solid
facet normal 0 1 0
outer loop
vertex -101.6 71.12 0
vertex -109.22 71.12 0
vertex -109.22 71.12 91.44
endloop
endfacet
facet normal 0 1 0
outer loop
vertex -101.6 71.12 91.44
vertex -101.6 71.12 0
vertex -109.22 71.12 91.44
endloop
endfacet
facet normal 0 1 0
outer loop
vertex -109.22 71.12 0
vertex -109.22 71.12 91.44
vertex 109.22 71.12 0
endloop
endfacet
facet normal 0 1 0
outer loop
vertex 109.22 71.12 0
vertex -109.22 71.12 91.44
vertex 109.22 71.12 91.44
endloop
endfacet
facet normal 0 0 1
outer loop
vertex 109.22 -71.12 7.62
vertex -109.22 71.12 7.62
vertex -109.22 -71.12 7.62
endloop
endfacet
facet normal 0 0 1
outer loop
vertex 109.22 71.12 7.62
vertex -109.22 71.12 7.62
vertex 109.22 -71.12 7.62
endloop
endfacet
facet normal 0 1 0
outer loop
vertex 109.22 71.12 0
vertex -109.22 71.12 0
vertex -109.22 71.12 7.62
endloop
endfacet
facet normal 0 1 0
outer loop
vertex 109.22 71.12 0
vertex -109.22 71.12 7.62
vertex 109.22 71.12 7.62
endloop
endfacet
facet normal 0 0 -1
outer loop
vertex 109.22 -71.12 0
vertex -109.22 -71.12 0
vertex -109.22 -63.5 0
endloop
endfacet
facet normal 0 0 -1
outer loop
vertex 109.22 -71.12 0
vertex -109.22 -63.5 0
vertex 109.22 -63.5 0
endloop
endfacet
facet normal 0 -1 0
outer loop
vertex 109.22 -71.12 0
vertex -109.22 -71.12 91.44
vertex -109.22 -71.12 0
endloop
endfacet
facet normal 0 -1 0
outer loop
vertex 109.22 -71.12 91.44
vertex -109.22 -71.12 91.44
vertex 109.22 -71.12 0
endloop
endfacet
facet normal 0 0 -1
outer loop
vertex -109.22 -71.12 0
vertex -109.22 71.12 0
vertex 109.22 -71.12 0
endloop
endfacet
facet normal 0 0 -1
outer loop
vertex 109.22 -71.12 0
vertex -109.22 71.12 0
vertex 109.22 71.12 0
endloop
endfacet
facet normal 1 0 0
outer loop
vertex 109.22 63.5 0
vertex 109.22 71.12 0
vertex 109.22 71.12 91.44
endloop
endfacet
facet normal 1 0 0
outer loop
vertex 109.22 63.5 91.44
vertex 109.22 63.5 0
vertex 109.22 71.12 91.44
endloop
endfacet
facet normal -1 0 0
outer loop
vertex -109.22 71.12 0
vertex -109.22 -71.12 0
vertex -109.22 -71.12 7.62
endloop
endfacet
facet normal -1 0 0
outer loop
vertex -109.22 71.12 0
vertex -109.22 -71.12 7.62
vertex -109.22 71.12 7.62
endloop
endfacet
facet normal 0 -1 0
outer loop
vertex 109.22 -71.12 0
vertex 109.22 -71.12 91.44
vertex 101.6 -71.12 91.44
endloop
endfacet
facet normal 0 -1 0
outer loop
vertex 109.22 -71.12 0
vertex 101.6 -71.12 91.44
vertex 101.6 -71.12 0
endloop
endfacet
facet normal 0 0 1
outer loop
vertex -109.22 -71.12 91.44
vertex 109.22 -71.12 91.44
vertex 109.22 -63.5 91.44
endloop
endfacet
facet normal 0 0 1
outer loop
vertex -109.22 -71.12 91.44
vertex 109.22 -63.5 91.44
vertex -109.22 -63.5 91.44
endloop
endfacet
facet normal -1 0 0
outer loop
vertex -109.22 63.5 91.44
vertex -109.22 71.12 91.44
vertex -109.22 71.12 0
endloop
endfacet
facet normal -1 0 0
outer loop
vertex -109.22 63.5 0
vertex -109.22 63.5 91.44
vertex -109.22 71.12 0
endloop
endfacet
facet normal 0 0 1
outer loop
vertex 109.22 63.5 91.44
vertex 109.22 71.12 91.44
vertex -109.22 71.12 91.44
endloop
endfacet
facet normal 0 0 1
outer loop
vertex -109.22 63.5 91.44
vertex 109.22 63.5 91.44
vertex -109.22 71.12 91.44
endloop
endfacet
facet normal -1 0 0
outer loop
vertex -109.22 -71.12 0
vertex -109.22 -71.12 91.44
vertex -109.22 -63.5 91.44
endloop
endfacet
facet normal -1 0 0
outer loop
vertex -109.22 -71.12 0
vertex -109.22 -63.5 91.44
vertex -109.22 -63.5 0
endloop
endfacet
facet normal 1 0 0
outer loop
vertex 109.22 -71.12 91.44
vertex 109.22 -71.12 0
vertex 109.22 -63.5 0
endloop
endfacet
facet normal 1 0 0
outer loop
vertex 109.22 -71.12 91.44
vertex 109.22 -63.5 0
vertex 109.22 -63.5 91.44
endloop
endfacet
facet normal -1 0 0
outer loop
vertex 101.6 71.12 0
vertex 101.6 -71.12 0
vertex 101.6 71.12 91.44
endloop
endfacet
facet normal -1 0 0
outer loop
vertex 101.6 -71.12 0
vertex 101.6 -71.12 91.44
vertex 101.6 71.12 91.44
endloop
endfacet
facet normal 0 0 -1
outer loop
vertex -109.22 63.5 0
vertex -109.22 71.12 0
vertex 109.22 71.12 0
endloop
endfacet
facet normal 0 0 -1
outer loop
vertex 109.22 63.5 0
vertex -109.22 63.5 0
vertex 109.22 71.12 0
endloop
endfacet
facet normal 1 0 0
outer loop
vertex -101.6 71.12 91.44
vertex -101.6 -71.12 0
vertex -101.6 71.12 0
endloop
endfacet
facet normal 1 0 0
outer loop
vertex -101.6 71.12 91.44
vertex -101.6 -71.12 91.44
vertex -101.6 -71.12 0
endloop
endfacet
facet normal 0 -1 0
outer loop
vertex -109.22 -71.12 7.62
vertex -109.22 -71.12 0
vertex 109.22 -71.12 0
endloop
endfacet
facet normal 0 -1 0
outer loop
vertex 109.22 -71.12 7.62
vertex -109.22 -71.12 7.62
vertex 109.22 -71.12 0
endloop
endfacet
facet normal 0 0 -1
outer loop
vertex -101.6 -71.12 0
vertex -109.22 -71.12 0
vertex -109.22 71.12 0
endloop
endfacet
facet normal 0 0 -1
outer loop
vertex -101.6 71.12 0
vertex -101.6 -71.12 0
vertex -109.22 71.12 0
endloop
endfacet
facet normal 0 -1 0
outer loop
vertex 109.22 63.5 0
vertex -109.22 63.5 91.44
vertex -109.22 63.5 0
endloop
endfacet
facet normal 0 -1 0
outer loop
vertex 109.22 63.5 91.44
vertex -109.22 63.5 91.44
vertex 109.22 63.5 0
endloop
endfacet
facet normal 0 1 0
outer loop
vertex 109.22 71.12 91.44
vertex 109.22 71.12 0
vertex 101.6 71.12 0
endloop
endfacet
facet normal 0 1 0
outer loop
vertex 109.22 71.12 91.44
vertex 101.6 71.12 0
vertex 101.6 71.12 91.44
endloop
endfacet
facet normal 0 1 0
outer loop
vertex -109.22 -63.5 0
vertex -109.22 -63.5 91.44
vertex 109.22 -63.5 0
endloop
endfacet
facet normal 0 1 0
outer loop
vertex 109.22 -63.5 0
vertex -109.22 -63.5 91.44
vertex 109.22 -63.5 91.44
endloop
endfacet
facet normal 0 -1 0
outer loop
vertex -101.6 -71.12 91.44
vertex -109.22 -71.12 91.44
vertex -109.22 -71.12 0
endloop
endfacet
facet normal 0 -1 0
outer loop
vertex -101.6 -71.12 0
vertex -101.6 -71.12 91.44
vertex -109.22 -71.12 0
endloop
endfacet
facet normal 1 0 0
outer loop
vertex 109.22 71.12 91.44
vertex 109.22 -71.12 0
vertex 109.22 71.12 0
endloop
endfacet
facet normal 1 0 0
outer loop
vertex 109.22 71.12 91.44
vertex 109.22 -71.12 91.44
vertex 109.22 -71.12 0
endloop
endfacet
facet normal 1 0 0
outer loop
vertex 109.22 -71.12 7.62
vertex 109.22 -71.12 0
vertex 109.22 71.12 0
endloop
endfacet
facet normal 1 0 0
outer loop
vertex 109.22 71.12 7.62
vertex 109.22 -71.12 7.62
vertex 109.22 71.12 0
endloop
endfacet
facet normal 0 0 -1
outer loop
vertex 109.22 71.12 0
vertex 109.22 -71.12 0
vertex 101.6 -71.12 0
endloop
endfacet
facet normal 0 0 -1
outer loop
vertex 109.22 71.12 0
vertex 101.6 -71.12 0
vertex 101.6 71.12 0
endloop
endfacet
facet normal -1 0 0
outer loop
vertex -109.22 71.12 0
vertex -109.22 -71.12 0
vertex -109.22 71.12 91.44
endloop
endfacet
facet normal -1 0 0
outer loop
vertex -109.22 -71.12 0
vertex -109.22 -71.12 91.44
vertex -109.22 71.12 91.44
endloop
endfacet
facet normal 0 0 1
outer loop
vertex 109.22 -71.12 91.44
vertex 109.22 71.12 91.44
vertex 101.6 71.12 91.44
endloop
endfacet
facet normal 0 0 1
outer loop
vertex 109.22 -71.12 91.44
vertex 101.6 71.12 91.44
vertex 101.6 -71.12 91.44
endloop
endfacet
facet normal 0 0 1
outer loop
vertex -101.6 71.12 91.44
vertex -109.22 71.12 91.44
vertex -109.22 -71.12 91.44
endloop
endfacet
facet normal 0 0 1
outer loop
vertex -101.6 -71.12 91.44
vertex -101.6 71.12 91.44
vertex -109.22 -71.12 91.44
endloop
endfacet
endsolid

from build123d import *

# Parameters (mm, degrees)
F0_W     = 218.44
F0_H     = 142.24
F1_DEPTH = 7.62
F4_DEPTH = 7.62
F8_DEPTH = 7.62


with BuildPart() as f1:
    # F0 (on Top) → F1 (new body)
    with BuildSketch(Plane.XY):
        Rectangle(F0_W, F0_H)
    extrude(amount=F1_DEPTH)


with BuildPart() as f4:
    # F3 (on offset) → F4 (new body)
    with BuildSketch(Plane.XZ.offset(71.12)):
        Polygon((-109.22, 0), (0, 0), (109.22, 0), (109.22, 91.44), (-109.22, 91.44), align=None)
    extrude(amount=-F4_DEPTH)


with BuildPart() as f5_1:
    # F5: instance of F4
    add(f4.part.mirror(Plane.XZ))


with BuildPart() as f8:
    # F7 (on offset) → F8 (new body)
    with BuildSketch(Plane.YZ.offset(109.22)):
        Polygon((-71.12, 0), (0, 0), (71.12, 0), (71.12, 91.44), (-71.12, 91.44), align=None)
    extrude(amount=-F8_DEPTH)


with BuildPart() as f9_1:
    # F9: instance of F8
    add(f8.part.mirror(Plane.YZ))


solid = Compound([f1.part, f4.part, f5_1.part, f8.part, f9_1.part])
